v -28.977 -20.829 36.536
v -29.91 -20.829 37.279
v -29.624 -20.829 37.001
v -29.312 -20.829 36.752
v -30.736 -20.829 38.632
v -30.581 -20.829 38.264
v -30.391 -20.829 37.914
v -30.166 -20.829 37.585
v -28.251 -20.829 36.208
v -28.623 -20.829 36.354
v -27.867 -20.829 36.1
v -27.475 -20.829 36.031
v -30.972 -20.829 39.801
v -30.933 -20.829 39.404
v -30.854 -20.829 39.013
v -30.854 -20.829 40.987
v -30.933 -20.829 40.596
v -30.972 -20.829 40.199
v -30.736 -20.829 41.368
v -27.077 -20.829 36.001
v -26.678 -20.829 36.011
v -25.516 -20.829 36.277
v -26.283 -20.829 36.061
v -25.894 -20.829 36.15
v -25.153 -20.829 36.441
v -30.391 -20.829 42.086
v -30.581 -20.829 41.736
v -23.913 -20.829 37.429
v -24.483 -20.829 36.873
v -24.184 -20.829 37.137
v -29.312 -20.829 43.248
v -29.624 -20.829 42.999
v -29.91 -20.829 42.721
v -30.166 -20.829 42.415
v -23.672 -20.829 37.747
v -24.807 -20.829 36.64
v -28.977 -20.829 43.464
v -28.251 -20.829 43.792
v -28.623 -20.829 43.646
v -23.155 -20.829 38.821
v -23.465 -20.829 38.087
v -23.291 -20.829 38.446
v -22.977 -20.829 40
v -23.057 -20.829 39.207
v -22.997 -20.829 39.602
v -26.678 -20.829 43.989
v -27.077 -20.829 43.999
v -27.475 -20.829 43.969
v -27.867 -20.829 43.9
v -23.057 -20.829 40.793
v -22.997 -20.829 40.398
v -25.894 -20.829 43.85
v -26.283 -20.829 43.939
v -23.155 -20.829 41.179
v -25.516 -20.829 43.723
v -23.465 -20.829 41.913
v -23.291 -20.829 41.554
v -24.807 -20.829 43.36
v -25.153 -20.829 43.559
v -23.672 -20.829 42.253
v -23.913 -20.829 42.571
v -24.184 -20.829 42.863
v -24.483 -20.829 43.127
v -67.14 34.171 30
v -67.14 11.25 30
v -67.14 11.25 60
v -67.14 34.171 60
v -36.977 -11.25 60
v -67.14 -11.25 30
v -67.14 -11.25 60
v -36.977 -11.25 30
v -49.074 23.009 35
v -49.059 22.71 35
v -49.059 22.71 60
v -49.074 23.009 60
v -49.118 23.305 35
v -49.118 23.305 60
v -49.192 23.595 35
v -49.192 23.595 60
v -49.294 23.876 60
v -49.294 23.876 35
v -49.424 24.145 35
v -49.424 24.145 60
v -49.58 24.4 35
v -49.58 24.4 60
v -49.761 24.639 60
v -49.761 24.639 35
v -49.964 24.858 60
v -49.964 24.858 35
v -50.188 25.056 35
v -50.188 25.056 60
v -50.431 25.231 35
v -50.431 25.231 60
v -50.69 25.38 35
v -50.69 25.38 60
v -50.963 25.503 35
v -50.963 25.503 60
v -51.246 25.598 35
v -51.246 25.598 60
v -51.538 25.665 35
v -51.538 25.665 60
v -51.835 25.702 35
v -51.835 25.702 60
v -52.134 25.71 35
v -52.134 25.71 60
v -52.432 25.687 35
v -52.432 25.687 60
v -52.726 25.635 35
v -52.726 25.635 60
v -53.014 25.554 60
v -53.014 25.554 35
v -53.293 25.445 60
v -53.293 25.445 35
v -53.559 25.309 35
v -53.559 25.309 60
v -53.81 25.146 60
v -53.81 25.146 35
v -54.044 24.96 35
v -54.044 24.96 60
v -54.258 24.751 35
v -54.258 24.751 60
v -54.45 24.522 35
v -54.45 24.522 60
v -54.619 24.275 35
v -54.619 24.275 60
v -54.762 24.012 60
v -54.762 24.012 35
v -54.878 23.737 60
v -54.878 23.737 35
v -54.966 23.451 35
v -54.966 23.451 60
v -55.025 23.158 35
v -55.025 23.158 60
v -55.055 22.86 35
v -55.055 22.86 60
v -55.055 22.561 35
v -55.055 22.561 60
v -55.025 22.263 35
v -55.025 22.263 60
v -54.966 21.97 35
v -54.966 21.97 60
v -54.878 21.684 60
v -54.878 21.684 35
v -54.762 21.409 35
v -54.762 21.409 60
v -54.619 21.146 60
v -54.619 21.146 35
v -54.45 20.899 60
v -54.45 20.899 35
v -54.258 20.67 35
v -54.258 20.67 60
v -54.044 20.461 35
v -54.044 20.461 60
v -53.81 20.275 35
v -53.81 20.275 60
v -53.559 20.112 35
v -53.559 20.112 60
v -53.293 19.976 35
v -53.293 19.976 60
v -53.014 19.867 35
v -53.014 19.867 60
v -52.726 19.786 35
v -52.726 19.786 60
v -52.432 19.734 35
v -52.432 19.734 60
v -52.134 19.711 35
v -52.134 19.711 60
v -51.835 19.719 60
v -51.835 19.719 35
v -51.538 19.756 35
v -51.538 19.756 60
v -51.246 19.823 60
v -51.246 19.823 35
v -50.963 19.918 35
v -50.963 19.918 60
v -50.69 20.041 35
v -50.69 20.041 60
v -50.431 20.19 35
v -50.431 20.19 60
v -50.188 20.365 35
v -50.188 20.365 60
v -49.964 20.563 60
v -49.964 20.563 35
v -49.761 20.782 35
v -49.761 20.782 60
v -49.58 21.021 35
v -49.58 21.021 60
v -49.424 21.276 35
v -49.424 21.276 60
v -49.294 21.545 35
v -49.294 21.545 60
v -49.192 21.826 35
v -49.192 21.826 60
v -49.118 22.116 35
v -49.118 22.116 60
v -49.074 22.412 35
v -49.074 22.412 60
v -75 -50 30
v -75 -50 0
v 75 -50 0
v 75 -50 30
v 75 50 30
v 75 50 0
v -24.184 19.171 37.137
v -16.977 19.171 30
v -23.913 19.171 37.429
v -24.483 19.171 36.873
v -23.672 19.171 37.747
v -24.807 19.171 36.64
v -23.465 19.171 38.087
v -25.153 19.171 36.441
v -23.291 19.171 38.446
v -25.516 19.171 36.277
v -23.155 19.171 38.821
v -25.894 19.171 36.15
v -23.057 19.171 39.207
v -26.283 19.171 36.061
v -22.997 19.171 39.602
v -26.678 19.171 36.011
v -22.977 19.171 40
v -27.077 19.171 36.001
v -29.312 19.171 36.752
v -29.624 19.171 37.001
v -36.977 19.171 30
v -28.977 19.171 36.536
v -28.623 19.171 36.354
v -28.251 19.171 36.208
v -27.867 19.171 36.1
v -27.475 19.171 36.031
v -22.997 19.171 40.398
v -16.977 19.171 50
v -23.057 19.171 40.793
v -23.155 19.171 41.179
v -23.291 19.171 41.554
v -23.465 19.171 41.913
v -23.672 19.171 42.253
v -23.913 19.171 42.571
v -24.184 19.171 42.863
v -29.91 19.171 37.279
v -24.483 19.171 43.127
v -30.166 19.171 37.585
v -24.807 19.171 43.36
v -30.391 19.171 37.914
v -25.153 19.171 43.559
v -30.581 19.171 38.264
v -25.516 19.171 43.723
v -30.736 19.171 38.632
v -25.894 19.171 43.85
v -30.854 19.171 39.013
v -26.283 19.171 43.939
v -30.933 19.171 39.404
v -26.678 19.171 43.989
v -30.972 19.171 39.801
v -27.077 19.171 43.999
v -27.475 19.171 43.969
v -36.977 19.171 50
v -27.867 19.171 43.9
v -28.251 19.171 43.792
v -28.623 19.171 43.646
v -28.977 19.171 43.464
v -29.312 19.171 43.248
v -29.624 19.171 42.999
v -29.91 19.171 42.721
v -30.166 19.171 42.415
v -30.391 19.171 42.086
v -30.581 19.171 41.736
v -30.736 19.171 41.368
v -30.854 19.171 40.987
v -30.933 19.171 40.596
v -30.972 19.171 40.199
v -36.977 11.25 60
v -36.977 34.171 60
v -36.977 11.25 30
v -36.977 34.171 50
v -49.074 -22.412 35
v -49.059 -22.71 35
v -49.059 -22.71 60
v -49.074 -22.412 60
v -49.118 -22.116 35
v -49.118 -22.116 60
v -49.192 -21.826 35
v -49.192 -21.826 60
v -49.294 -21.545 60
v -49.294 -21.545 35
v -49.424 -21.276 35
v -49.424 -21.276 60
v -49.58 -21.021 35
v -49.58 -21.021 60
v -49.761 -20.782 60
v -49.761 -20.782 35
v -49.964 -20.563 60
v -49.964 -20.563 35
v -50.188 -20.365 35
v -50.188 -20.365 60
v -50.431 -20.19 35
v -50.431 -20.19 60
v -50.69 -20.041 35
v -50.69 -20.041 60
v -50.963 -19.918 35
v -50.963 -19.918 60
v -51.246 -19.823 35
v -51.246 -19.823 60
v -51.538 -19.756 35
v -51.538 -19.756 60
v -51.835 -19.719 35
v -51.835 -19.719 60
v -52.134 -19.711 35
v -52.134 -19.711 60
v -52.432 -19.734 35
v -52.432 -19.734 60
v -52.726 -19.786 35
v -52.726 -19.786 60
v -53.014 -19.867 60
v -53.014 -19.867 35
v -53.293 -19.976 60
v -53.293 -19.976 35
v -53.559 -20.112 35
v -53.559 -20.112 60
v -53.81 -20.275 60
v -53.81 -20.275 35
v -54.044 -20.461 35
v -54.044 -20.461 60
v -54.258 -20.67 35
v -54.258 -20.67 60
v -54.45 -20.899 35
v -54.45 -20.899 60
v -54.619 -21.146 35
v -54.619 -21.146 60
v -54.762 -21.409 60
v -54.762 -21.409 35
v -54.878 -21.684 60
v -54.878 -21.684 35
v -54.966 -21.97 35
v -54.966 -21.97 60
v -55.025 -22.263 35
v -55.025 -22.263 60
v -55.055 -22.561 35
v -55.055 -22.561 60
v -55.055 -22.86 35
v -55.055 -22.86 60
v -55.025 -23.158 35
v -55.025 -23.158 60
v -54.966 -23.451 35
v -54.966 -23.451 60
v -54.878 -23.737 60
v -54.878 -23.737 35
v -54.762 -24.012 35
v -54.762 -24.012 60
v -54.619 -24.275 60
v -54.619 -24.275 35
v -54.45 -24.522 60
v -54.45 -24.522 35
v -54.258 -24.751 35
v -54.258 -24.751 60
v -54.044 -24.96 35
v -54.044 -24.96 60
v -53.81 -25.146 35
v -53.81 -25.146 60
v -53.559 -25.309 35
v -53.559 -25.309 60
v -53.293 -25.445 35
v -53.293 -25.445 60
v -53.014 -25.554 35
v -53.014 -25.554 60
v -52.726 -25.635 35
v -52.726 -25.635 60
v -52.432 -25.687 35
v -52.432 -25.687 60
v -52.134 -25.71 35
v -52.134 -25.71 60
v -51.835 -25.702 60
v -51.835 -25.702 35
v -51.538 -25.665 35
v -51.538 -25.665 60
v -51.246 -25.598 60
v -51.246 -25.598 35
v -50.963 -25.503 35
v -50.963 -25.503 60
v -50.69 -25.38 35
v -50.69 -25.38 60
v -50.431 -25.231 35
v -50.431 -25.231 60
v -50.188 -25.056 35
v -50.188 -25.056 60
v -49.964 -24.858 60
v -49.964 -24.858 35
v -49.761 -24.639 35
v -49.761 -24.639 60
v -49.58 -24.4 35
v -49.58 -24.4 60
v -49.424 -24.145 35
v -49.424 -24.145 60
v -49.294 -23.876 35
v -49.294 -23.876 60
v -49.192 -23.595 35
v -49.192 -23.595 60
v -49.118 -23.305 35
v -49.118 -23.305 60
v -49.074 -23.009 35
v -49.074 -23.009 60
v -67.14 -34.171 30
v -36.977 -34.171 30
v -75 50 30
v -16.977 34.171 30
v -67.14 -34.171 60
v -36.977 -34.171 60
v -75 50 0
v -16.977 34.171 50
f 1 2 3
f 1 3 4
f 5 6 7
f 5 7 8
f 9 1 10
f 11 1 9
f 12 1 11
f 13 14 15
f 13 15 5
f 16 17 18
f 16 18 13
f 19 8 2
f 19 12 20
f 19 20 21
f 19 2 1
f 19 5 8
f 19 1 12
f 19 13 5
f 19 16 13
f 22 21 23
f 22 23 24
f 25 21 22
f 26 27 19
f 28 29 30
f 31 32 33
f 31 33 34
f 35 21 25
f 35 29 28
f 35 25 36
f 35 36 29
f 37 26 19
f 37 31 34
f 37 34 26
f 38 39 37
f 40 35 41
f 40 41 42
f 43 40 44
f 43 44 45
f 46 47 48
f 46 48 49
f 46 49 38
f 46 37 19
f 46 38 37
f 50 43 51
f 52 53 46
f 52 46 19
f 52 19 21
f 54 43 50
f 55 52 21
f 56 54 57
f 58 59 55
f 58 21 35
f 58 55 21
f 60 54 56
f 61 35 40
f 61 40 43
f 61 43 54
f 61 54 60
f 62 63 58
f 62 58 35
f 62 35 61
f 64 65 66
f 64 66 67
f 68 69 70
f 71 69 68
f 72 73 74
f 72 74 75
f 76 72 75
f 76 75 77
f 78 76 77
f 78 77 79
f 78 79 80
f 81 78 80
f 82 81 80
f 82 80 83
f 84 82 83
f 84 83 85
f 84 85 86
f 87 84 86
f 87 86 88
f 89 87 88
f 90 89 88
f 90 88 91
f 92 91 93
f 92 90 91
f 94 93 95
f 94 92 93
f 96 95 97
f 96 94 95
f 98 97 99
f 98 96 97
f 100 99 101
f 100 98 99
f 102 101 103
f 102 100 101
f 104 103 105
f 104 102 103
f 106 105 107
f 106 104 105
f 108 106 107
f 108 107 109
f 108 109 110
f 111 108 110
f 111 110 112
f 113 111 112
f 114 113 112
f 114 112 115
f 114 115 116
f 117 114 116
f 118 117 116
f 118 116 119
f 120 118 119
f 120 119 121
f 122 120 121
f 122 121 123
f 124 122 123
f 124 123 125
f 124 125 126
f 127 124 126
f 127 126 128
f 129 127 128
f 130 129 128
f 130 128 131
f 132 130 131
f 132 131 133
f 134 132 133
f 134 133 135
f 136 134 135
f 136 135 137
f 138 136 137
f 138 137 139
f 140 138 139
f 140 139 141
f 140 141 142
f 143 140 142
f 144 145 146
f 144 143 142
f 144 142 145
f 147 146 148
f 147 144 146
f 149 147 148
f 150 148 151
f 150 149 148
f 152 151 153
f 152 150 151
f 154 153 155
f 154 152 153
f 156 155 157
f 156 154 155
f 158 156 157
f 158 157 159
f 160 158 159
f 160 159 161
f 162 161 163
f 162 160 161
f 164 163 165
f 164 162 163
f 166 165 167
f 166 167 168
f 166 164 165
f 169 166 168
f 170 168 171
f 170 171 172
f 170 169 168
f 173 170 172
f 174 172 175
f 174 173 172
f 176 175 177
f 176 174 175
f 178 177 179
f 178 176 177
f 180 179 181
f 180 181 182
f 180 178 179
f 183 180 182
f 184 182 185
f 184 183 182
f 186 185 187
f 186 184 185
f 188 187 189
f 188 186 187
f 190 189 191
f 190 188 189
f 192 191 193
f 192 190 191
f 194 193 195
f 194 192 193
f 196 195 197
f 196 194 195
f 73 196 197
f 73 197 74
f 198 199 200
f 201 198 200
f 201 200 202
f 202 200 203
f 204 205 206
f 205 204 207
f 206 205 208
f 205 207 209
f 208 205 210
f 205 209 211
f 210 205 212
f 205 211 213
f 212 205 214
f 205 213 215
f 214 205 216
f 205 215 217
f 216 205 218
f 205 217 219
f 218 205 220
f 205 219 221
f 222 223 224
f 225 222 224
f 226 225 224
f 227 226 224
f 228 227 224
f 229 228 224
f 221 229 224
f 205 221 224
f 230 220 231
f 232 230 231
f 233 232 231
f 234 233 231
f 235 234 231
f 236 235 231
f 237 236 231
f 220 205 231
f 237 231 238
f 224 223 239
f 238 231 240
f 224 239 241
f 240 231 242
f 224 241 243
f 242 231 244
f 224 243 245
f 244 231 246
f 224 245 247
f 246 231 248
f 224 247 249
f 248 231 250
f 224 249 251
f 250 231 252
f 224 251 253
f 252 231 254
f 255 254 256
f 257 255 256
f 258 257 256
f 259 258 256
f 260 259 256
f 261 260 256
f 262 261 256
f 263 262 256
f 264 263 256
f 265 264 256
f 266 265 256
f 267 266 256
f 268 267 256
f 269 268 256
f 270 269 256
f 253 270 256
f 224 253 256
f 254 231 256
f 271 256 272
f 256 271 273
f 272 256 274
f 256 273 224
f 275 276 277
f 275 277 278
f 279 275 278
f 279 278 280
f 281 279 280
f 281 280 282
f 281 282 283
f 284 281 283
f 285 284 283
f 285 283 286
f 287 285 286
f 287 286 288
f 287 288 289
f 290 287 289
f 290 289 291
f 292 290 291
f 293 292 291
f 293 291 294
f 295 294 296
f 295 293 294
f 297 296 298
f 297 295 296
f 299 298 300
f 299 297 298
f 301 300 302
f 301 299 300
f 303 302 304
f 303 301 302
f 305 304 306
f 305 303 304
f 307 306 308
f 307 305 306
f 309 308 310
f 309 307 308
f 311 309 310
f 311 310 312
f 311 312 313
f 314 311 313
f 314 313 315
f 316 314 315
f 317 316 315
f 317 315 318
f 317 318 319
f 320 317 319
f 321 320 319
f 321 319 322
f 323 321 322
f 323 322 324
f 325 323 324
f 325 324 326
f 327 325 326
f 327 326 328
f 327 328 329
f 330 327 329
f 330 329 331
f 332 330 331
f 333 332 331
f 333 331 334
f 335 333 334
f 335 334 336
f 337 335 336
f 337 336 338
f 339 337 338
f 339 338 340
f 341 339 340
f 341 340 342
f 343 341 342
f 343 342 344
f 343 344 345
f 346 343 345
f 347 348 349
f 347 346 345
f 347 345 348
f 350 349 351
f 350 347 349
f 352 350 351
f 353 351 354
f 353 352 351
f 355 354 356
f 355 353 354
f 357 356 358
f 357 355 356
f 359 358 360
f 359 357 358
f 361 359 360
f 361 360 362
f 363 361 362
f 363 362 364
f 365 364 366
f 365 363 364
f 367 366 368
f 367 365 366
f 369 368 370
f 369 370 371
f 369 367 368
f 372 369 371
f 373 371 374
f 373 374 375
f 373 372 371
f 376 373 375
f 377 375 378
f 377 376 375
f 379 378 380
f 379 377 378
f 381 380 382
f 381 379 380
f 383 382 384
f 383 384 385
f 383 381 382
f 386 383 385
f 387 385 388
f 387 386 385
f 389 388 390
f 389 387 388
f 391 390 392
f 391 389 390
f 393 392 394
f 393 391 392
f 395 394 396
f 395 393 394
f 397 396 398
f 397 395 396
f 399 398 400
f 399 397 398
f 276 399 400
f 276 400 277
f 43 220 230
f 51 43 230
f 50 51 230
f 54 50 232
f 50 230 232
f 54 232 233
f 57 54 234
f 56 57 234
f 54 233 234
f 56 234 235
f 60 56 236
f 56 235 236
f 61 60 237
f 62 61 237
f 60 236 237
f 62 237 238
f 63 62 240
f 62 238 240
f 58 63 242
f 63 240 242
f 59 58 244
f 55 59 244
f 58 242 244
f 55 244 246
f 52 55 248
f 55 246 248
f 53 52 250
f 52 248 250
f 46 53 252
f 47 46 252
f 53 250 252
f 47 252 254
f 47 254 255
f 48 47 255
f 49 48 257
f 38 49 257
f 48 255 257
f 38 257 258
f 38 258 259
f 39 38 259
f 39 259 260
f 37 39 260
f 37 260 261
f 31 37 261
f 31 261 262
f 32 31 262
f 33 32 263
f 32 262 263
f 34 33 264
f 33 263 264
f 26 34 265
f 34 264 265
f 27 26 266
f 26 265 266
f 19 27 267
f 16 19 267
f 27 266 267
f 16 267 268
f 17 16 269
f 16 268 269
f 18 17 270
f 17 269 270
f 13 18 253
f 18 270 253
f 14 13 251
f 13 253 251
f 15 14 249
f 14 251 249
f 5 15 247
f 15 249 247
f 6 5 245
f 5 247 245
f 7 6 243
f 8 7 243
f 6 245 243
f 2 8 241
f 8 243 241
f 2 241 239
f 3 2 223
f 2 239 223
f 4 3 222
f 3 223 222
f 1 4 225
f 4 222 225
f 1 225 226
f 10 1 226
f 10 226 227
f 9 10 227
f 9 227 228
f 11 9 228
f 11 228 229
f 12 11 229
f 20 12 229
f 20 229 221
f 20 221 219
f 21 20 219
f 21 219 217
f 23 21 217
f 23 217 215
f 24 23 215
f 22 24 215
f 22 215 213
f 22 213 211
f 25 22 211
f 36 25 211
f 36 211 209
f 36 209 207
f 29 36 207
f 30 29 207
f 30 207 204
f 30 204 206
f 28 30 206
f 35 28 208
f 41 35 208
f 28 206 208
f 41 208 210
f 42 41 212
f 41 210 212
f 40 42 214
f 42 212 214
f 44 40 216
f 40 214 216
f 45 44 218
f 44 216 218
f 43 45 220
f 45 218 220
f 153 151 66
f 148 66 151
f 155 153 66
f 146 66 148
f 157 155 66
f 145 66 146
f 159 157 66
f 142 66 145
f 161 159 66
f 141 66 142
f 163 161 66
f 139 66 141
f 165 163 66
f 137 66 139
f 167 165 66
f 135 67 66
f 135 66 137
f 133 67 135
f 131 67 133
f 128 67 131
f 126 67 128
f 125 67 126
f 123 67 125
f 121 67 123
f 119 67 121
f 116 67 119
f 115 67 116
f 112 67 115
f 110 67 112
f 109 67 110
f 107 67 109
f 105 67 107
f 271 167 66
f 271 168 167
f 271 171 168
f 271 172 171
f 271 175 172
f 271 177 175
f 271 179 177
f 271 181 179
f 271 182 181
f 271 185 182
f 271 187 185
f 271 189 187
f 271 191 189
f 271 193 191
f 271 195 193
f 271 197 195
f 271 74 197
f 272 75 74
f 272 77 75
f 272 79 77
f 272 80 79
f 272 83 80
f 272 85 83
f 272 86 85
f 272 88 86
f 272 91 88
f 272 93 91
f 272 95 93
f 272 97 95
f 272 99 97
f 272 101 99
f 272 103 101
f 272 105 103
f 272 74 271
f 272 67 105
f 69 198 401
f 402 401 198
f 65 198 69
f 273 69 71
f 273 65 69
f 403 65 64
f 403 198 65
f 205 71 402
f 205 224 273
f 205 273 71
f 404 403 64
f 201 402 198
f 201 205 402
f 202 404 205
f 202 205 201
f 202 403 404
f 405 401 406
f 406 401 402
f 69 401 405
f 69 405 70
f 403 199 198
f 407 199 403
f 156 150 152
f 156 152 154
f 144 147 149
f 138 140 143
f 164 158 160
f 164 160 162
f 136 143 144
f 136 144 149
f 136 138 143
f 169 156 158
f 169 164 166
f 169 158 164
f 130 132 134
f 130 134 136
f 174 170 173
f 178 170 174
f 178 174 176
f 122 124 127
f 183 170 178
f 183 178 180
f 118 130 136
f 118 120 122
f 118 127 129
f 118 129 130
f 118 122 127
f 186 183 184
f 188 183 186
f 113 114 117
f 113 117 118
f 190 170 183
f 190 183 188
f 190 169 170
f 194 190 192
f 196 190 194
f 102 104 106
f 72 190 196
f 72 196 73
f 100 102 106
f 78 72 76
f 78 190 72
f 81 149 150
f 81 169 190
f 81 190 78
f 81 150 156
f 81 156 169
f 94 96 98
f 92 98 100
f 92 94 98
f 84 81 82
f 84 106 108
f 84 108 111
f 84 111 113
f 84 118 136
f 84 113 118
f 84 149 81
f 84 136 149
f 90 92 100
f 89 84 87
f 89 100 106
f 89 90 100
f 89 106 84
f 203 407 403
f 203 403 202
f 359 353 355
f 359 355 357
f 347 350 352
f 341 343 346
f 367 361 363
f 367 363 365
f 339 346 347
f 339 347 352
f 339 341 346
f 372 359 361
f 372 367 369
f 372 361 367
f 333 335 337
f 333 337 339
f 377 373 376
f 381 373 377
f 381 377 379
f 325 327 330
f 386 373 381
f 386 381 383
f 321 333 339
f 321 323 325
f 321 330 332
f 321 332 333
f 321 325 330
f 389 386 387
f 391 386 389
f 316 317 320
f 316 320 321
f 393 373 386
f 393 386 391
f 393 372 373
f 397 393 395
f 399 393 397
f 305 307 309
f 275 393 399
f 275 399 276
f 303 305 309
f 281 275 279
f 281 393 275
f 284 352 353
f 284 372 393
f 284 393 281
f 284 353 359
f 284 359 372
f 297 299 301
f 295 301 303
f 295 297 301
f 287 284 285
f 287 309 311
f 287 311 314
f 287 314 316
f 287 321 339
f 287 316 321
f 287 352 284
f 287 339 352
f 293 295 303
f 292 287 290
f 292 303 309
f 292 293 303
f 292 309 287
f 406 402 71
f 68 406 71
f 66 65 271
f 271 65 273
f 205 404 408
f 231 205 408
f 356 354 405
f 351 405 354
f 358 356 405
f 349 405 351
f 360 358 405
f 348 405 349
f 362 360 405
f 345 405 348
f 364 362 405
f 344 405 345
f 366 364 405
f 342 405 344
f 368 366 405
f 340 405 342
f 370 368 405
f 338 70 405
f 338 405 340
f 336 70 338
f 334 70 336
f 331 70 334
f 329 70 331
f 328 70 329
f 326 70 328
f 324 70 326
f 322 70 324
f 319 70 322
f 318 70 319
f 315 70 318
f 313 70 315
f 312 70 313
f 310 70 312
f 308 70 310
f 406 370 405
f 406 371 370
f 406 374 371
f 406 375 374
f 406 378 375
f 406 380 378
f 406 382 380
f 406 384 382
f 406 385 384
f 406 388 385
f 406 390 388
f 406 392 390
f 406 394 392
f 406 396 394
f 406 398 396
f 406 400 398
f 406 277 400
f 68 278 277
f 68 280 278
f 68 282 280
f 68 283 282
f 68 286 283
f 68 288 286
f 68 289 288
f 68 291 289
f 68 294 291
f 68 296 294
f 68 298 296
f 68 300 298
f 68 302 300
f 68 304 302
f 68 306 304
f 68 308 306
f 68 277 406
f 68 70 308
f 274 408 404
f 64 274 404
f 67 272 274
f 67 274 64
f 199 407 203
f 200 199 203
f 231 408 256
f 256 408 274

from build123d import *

# Parameters (mm, degrees)
F0_W     = 150
F0_H     = 100
F1_DEPTH = 30
F2_R     = 3
F3_DEPTH = 5
F2_W     = 30.162632
F2_H     = 22.921
F4_DEPTH = 30
F5_W     = 20
F5_H     = 20
F6_DEPTH = 15
F7_R     = 4
F8_DEPTH = 40


with BuildPart() as f1:
    # F0 (on Top) → F1 (new body)
    with BuildSketch(Plane.XY):
        Rectangle(F0_W, F0_H)
    extrude(amount=F1_DEPTH)

    # F2 (on face) → F3 (join)
    with BuildSketch(Plane.XY.offset(30)):
        with Locations((-52.058708, -22.7105)):
            Circle(F2_R)
        with Locations((-52.058708, 22.7105)):
            Circle(F2_R)
    extrude(amount=F3_DEPTH)

    # F2 (on face) → F4 (join)
    with BuildSketch(Plane.XY.offset(30)):
        with Locations((-52.058708, 22.7105)):
            Rectangle(F2_W, F2_H)
        with Locations((-52.058708, 22.7105)):
            Circle(F2_R, mode=Mode.SUBTRACT)
        with Locations((-52.058708, -22.7105)):
            Rectangle(F2_W, F2_H)
        with Locations((-52.058708, -22.7105)):
            Circle(F2_R, mode=Mode.SUBTRACT)
    extrude(amount=F4_DEPTH)

    # F5 (on face) → F6 (join)
    with BuildSketch(Plane(origin=(0, 34.171, 0), x_dir=(-1, 0, 0), z_dir=(0, 1, 0))):
        with Locations((26.977392, 40)):
            Rectangle(F5_W, F5_H)
    extrude(amount=-F6_DEPTH)

    # F7 (on face) → F8 (join)
    with BuildSketch(Plane.XZ.offset(-19.171)):
        with Locations((-26.977392, 40)):
            Circle(F7_R)
    extrude(amount=F8_DEPTH)


solid = f1.part
